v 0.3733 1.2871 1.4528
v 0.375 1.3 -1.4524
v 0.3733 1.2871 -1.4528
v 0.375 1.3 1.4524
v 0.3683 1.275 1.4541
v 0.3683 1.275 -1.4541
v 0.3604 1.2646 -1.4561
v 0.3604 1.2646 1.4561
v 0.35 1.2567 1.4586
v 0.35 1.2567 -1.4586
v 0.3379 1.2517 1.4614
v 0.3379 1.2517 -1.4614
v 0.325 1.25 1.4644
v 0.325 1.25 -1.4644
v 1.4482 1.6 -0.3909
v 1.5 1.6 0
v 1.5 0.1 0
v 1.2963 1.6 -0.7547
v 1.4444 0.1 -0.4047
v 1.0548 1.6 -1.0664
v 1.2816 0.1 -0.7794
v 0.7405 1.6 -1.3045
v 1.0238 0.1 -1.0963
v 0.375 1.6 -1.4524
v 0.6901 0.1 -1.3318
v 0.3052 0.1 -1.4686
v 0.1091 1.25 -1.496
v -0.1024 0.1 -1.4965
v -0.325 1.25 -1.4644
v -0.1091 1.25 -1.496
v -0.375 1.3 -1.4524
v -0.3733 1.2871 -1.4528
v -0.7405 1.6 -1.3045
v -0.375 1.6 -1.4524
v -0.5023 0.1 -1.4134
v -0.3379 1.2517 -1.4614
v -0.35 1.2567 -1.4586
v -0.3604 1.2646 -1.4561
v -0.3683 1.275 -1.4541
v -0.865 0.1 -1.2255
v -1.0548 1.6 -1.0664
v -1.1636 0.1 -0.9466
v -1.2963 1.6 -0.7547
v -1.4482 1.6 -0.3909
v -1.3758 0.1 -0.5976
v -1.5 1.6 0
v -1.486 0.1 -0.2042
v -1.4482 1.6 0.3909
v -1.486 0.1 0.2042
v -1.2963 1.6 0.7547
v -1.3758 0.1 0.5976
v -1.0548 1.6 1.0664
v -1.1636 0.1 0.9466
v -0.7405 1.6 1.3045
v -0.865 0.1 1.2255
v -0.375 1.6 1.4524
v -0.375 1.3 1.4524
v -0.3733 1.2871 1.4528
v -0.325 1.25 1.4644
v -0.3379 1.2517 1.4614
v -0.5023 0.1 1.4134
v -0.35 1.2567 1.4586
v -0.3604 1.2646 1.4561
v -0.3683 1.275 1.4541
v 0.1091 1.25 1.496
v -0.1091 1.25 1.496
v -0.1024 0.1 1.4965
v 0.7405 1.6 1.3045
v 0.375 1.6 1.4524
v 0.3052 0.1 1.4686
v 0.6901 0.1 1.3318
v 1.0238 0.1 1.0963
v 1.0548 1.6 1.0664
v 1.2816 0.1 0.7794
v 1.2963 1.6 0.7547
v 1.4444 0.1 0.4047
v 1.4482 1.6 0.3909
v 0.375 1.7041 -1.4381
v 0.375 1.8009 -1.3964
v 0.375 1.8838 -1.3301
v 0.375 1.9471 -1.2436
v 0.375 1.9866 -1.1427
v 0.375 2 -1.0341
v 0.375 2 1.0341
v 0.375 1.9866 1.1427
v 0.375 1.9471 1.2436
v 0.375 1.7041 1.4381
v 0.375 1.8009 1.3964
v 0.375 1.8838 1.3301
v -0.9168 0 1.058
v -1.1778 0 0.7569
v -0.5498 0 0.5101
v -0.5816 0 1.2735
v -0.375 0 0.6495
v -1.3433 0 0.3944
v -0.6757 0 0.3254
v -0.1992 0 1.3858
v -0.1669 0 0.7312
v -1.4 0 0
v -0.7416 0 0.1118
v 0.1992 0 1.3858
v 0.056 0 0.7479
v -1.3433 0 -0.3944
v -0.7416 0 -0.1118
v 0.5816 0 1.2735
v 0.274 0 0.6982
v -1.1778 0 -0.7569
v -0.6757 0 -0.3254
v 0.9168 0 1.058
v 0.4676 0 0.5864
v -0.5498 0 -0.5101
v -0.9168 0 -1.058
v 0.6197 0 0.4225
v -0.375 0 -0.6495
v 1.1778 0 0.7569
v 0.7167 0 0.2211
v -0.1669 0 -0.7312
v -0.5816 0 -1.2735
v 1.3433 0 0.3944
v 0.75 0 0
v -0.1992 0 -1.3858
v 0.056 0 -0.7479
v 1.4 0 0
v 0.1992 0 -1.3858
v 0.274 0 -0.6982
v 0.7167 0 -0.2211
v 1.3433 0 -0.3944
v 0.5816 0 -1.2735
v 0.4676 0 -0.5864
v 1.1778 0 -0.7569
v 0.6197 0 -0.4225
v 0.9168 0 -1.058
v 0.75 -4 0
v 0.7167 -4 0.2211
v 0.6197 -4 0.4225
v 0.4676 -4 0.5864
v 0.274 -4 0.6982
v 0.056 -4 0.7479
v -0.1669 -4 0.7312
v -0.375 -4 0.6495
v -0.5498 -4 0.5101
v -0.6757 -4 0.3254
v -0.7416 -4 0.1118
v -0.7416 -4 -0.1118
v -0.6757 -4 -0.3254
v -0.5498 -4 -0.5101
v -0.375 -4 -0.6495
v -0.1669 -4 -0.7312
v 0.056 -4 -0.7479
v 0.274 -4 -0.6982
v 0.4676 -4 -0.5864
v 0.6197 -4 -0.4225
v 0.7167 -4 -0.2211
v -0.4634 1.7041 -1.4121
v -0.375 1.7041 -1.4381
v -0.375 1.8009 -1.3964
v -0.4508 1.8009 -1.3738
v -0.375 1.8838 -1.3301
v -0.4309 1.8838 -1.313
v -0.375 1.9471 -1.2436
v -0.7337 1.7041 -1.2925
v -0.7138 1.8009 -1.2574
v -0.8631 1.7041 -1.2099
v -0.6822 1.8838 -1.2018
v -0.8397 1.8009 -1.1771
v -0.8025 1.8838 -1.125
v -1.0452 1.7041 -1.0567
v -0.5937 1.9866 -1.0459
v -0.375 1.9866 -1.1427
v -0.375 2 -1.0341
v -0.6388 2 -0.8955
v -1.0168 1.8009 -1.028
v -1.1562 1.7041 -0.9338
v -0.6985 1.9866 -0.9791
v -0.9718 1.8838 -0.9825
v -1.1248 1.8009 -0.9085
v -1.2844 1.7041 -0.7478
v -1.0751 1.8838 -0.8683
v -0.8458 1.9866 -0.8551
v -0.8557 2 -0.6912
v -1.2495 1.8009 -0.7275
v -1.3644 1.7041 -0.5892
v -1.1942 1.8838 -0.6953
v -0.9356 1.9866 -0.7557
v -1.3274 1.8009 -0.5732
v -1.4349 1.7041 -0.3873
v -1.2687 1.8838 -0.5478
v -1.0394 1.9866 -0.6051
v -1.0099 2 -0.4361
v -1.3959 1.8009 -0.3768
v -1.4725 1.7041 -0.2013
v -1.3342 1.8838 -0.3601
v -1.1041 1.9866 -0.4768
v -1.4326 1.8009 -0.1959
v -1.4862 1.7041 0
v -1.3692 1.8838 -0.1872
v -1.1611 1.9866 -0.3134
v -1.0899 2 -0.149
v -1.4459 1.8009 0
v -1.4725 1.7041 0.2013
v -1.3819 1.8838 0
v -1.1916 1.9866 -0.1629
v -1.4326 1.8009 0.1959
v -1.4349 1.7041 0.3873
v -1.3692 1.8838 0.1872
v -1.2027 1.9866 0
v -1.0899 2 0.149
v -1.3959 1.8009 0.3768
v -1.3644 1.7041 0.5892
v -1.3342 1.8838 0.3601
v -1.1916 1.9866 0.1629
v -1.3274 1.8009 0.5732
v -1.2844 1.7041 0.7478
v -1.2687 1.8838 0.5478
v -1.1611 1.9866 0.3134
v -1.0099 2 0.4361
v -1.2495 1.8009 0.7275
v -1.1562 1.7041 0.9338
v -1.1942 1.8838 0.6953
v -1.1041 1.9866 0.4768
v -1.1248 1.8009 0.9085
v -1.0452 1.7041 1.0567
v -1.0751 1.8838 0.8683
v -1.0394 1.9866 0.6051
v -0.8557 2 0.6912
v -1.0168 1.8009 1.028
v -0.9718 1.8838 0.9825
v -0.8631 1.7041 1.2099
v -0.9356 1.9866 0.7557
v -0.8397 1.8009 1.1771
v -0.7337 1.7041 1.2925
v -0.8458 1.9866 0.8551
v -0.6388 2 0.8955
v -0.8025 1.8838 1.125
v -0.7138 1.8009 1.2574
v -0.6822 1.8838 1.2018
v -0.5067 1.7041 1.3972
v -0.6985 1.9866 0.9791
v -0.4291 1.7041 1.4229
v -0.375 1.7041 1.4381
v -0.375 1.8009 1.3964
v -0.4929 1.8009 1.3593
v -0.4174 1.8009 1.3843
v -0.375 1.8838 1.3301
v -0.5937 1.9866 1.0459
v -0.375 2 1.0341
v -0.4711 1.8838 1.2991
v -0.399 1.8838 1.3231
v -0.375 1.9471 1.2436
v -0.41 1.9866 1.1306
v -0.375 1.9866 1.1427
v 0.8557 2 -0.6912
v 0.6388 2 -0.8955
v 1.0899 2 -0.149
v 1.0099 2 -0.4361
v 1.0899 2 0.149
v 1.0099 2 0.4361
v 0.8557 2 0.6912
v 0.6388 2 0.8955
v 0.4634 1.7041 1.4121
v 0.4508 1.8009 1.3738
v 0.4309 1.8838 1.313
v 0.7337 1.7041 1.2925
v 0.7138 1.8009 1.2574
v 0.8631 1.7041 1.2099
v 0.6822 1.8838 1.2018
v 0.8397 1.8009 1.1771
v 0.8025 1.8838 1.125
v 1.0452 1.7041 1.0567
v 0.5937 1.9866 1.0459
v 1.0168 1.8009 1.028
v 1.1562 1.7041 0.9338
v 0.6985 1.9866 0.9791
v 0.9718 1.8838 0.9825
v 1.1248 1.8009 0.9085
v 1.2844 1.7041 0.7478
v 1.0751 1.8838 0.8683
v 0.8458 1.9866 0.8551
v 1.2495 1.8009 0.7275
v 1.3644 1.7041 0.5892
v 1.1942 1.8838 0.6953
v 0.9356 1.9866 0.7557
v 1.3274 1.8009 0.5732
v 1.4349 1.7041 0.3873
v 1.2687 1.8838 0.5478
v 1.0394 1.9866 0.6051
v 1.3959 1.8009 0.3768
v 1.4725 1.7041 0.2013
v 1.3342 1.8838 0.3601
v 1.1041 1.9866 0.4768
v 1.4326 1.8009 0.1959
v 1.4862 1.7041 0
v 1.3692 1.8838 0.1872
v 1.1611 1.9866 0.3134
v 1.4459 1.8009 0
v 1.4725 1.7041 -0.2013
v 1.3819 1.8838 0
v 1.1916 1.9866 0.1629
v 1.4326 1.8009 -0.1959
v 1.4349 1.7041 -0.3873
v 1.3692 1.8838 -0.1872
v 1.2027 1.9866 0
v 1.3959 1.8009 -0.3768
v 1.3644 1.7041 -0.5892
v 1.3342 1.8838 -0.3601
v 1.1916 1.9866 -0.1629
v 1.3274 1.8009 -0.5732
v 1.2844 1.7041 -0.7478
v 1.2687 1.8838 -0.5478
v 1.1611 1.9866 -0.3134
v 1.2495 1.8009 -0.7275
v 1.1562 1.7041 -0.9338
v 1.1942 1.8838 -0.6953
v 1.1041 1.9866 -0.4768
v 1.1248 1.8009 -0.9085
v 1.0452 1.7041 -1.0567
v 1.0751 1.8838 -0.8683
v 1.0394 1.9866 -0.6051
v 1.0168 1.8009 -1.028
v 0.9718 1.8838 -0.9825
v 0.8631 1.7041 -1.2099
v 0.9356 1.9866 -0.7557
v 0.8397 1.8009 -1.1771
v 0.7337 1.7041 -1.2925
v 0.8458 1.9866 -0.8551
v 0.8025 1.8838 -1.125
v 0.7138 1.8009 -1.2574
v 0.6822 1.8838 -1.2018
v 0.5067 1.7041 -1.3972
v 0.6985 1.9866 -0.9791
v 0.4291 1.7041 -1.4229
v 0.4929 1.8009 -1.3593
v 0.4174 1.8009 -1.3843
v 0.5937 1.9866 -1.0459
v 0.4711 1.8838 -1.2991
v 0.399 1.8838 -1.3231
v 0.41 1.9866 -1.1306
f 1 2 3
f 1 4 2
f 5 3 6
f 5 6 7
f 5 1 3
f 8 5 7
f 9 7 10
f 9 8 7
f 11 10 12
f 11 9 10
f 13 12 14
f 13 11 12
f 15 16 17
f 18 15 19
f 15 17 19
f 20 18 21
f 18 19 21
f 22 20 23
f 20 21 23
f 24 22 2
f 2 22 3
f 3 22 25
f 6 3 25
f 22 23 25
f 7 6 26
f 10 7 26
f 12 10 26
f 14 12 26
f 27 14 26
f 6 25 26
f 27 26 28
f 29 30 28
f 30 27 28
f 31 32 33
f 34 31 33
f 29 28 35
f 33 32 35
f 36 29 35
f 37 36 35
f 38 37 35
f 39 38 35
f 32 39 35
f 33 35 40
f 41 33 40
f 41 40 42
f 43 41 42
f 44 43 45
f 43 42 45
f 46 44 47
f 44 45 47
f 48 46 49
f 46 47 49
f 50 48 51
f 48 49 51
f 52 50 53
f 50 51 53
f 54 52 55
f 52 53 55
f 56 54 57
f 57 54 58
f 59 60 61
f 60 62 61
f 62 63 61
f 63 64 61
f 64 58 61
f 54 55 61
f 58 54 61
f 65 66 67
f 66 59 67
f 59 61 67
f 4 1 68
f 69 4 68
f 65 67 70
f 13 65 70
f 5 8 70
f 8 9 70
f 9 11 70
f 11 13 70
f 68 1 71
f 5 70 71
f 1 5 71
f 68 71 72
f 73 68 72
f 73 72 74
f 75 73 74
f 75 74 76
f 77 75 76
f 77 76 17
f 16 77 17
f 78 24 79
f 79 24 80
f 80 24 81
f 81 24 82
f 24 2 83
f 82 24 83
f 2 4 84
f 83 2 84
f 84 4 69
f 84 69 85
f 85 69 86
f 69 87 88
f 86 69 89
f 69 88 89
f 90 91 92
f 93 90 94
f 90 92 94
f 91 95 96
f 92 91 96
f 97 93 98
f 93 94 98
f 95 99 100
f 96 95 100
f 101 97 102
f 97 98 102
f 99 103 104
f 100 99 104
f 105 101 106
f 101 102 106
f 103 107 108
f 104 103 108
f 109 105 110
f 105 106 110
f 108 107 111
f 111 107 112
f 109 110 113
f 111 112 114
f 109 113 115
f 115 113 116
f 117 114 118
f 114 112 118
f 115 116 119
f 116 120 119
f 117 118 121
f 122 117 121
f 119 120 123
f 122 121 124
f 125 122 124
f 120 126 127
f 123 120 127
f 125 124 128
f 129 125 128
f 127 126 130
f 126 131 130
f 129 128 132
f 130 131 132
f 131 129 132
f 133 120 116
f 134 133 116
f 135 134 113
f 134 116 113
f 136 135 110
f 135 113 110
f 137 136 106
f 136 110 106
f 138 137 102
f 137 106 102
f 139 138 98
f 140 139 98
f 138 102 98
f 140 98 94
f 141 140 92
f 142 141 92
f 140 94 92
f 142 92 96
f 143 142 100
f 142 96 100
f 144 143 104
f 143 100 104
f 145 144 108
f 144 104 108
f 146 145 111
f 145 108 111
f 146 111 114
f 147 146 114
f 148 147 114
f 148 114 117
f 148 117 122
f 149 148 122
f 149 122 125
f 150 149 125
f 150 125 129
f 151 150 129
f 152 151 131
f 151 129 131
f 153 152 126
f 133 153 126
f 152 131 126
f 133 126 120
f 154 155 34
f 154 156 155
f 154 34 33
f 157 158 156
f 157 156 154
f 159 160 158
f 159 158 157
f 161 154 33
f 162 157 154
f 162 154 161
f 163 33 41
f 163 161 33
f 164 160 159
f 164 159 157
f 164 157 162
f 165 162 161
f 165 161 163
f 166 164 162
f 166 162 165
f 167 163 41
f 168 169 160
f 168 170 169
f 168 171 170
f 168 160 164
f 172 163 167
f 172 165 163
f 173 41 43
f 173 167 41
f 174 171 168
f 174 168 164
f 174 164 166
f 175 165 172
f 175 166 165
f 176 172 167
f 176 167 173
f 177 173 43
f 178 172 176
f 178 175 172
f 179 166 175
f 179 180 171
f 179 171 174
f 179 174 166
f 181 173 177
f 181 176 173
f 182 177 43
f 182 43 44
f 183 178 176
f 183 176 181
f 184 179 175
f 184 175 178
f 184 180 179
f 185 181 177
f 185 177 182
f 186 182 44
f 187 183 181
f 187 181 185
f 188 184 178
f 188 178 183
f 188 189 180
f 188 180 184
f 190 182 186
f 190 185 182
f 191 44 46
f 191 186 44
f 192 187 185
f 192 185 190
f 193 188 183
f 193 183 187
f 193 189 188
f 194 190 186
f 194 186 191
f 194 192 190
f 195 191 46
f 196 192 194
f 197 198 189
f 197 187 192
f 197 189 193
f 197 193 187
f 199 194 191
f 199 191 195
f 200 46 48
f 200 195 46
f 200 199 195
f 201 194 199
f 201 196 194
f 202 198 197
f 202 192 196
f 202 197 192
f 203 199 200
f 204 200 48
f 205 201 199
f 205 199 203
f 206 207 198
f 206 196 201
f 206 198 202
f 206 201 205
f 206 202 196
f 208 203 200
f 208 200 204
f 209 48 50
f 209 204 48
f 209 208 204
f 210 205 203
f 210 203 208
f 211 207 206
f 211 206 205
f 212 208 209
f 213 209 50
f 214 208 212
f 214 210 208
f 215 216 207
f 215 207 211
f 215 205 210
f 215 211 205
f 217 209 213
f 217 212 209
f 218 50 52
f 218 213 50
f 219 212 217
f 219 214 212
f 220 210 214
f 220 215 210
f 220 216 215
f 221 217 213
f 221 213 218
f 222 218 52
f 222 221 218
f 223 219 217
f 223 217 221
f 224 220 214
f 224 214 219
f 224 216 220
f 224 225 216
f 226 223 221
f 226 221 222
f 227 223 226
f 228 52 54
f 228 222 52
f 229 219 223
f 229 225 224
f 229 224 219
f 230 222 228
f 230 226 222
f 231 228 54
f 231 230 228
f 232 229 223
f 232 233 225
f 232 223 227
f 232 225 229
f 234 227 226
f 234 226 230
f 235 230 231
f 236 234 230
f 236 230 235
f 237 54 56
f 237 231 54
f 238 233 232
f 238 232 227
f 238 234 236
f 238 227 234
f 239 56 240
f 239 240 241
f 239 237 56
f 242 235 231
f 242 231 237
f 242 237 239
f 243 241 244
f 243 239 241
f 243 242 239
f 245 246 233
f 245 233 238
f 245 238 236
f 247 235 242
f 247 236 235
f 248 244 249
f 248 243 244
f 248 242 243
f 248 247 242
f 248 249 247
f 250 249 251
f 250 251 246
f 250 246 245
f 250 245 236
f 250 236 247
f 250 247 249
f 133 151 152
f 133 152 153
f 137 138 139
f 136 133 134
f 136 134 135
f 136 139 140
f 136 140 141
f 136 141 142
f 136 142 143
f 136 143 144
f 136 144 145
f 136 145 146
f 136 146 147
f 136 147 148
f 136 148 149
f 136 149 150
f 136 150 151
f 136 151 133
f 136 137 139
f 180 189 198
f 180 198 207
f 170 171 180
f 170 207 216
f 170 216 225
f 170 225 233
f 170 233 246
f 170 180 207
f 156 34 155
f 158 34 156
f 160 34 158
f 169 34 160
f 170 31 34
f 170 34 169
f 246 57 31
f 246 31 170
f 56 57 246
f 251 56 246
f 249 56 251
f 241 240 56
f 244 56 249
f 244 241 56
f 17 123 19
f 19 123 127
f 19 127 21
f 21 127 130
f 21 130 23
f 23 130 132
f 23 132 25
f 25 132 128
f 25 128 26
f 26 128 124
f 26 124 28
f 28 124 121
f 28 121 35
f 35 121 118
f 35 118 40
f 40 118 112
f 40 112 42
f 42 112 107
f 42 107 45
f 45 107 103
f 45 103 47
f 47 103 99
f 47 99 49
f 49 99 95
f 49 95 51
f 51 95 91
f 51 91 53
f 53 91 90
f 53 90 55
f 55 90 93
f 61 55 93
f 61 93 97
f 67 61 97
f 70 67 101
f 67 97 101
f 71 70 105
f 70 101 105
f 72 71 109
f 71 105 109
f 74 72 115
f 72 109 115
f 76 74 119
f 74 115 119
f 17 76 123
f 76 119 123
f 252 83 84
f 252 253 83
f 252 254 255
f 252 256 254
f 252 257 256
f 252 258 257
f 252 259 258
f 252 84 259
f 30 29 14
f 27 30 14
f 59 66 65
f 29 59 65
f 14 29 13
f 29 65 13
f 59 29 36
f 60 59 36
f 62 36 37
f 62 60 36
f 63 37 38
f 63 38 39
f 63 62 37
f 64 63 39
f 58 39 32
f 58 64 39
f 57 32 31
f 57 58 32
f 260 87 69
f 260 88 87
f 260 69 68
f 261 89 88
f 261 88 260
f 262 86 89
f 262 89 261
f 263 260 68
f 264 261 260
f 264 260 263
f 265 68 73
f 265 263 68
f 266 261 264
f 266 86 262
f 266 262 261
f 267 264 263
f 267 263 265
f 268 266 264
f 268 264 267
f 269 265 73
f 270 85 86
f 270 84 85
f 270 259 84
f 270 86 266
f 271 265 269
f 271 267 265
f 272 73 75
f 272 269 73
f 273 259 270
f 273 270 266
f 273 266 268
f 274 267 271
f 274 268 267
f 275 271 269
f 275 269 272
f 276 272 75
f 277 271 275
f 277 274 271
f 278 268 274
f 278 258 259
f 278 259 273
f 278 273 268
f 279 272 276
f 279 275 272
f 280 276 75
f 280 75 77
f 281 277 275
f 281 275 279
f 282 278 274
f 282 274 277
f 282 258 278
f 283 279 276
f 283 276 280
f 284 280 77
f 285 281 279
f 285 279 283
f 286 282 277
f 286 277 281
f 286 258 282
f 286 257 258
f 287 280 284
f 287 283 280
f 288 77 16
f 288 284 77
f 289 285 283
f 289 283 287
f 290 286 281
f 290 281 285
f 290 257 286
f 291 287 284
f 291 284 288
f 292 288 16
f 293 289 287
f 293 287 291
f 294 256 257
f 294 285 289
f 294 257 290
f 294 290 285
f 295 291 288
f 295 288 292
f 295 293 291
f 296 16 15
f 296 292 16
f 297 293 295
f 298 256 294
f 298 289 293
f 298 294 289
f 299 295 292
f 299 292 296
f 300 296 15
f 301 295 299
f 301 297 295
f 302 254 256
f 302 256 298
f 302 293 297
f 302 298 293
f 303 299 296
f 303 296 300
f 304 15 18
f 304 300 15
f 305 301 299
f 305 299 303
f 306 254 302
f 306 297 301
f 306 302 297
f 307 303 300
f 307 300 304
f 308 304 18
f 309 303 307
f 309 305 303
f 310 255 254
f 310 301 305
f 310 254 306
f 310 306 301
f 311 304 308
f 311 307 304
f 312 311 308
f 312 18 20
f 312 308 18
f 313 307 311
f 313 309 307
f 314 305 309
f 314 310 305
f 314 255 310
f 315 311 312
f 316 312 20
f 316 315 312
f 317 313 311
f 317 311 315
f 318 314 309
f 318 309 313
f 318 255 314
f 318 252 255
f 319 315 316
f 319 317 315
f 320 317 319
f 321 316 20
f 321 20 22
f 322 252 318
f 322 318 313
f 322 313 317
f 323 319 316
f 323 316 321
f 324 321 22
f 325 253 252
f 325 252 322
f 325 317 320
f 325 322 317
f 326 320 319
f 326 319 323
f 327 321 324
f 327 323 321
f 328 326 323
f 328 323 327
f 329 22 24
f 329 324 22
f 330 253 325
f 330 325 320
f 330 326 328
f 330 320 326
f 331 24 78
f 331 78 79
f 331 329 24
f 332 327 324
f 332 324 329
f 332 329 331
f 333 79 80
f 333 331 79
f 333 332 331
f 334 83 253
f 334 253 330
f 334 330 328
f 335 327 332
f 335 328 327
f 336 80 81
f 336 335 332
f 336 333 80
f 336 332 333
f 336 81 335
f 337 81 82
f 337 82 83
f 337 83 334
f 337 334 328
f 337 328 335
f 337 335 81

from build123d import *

# Parameters (mm, degrees)
SKETCH1_R           = 1.5
BOSS_EXTRUDE1_DEPTH = 2
SKETCH2_W           = 0.75
SKETCH2_H           = 1.5
CUT_EXTRUDE1_DEPTH  = 6
SKETCH3_R           = 0.75
BOSS_EXTRUDE2_DEPTH = 4
FILLET1_R           = 0.05
CHAMFER2_SIZE       = 0.1
FILLET2_R           = 0.4


with BuildPart() as part:
    # Sketch1 → Boss-Extrude1 (new body)
    with BuildSketch(Plane(origin=(0, 0, 0), x_dir=(1, 0, 0), z_dir=(0, 1, 0))):
        Circle(SKETCH1_R)
    extrude(amount=BOSS_EXTRUDE1_DEPTH)

    # Sketch2 → Cut-Extrude1 (cut, symmetric)
    with BuildSketch(Plane.XY):
        with Locations((0, 2)):
            Rectangle(SKETCH2_W, SKETCH2_H)
    extrude(amount=CUT_EXTRUDE1_DEPTH, both=True, mode=Mode.SUBTRACT)

    # Sketch3 → Boss-Extrude2 (add)
    with BuildSketch(Plane.XZ):
        Circle(SKETCH3_R)
    extrude(amount=BOSS_EXTRUDE2_DEPTH)

    # Fillet1
    fillet1_edges = [part.edges().sort_by_distance(p)[0] for p in [
        (-0.375, 1.25, 0),
        (0.375, 1.25, 0),
    ]]
    fillet(fillet1_edges, radius=FILLET1_R)

    # Chamfer2
    chamfer2_edges = [part.edges().sort_by_distance(p)[0] for p in [
        (-1.5, 0, 0),
    ]]
    chamfer(chamfer2_edges, length=CHAMFER2_SIZE)

    # Fillet2
    fillet2_edges = [part.edges().sort_by_distance(p)[0] for p in [
        (1.185854123, 2, 0.918558654),
        (-1.5, 2, 0),
    ]]
    fillet(fillet2_edges, radius=FILLET2_R)


solid = part.part
